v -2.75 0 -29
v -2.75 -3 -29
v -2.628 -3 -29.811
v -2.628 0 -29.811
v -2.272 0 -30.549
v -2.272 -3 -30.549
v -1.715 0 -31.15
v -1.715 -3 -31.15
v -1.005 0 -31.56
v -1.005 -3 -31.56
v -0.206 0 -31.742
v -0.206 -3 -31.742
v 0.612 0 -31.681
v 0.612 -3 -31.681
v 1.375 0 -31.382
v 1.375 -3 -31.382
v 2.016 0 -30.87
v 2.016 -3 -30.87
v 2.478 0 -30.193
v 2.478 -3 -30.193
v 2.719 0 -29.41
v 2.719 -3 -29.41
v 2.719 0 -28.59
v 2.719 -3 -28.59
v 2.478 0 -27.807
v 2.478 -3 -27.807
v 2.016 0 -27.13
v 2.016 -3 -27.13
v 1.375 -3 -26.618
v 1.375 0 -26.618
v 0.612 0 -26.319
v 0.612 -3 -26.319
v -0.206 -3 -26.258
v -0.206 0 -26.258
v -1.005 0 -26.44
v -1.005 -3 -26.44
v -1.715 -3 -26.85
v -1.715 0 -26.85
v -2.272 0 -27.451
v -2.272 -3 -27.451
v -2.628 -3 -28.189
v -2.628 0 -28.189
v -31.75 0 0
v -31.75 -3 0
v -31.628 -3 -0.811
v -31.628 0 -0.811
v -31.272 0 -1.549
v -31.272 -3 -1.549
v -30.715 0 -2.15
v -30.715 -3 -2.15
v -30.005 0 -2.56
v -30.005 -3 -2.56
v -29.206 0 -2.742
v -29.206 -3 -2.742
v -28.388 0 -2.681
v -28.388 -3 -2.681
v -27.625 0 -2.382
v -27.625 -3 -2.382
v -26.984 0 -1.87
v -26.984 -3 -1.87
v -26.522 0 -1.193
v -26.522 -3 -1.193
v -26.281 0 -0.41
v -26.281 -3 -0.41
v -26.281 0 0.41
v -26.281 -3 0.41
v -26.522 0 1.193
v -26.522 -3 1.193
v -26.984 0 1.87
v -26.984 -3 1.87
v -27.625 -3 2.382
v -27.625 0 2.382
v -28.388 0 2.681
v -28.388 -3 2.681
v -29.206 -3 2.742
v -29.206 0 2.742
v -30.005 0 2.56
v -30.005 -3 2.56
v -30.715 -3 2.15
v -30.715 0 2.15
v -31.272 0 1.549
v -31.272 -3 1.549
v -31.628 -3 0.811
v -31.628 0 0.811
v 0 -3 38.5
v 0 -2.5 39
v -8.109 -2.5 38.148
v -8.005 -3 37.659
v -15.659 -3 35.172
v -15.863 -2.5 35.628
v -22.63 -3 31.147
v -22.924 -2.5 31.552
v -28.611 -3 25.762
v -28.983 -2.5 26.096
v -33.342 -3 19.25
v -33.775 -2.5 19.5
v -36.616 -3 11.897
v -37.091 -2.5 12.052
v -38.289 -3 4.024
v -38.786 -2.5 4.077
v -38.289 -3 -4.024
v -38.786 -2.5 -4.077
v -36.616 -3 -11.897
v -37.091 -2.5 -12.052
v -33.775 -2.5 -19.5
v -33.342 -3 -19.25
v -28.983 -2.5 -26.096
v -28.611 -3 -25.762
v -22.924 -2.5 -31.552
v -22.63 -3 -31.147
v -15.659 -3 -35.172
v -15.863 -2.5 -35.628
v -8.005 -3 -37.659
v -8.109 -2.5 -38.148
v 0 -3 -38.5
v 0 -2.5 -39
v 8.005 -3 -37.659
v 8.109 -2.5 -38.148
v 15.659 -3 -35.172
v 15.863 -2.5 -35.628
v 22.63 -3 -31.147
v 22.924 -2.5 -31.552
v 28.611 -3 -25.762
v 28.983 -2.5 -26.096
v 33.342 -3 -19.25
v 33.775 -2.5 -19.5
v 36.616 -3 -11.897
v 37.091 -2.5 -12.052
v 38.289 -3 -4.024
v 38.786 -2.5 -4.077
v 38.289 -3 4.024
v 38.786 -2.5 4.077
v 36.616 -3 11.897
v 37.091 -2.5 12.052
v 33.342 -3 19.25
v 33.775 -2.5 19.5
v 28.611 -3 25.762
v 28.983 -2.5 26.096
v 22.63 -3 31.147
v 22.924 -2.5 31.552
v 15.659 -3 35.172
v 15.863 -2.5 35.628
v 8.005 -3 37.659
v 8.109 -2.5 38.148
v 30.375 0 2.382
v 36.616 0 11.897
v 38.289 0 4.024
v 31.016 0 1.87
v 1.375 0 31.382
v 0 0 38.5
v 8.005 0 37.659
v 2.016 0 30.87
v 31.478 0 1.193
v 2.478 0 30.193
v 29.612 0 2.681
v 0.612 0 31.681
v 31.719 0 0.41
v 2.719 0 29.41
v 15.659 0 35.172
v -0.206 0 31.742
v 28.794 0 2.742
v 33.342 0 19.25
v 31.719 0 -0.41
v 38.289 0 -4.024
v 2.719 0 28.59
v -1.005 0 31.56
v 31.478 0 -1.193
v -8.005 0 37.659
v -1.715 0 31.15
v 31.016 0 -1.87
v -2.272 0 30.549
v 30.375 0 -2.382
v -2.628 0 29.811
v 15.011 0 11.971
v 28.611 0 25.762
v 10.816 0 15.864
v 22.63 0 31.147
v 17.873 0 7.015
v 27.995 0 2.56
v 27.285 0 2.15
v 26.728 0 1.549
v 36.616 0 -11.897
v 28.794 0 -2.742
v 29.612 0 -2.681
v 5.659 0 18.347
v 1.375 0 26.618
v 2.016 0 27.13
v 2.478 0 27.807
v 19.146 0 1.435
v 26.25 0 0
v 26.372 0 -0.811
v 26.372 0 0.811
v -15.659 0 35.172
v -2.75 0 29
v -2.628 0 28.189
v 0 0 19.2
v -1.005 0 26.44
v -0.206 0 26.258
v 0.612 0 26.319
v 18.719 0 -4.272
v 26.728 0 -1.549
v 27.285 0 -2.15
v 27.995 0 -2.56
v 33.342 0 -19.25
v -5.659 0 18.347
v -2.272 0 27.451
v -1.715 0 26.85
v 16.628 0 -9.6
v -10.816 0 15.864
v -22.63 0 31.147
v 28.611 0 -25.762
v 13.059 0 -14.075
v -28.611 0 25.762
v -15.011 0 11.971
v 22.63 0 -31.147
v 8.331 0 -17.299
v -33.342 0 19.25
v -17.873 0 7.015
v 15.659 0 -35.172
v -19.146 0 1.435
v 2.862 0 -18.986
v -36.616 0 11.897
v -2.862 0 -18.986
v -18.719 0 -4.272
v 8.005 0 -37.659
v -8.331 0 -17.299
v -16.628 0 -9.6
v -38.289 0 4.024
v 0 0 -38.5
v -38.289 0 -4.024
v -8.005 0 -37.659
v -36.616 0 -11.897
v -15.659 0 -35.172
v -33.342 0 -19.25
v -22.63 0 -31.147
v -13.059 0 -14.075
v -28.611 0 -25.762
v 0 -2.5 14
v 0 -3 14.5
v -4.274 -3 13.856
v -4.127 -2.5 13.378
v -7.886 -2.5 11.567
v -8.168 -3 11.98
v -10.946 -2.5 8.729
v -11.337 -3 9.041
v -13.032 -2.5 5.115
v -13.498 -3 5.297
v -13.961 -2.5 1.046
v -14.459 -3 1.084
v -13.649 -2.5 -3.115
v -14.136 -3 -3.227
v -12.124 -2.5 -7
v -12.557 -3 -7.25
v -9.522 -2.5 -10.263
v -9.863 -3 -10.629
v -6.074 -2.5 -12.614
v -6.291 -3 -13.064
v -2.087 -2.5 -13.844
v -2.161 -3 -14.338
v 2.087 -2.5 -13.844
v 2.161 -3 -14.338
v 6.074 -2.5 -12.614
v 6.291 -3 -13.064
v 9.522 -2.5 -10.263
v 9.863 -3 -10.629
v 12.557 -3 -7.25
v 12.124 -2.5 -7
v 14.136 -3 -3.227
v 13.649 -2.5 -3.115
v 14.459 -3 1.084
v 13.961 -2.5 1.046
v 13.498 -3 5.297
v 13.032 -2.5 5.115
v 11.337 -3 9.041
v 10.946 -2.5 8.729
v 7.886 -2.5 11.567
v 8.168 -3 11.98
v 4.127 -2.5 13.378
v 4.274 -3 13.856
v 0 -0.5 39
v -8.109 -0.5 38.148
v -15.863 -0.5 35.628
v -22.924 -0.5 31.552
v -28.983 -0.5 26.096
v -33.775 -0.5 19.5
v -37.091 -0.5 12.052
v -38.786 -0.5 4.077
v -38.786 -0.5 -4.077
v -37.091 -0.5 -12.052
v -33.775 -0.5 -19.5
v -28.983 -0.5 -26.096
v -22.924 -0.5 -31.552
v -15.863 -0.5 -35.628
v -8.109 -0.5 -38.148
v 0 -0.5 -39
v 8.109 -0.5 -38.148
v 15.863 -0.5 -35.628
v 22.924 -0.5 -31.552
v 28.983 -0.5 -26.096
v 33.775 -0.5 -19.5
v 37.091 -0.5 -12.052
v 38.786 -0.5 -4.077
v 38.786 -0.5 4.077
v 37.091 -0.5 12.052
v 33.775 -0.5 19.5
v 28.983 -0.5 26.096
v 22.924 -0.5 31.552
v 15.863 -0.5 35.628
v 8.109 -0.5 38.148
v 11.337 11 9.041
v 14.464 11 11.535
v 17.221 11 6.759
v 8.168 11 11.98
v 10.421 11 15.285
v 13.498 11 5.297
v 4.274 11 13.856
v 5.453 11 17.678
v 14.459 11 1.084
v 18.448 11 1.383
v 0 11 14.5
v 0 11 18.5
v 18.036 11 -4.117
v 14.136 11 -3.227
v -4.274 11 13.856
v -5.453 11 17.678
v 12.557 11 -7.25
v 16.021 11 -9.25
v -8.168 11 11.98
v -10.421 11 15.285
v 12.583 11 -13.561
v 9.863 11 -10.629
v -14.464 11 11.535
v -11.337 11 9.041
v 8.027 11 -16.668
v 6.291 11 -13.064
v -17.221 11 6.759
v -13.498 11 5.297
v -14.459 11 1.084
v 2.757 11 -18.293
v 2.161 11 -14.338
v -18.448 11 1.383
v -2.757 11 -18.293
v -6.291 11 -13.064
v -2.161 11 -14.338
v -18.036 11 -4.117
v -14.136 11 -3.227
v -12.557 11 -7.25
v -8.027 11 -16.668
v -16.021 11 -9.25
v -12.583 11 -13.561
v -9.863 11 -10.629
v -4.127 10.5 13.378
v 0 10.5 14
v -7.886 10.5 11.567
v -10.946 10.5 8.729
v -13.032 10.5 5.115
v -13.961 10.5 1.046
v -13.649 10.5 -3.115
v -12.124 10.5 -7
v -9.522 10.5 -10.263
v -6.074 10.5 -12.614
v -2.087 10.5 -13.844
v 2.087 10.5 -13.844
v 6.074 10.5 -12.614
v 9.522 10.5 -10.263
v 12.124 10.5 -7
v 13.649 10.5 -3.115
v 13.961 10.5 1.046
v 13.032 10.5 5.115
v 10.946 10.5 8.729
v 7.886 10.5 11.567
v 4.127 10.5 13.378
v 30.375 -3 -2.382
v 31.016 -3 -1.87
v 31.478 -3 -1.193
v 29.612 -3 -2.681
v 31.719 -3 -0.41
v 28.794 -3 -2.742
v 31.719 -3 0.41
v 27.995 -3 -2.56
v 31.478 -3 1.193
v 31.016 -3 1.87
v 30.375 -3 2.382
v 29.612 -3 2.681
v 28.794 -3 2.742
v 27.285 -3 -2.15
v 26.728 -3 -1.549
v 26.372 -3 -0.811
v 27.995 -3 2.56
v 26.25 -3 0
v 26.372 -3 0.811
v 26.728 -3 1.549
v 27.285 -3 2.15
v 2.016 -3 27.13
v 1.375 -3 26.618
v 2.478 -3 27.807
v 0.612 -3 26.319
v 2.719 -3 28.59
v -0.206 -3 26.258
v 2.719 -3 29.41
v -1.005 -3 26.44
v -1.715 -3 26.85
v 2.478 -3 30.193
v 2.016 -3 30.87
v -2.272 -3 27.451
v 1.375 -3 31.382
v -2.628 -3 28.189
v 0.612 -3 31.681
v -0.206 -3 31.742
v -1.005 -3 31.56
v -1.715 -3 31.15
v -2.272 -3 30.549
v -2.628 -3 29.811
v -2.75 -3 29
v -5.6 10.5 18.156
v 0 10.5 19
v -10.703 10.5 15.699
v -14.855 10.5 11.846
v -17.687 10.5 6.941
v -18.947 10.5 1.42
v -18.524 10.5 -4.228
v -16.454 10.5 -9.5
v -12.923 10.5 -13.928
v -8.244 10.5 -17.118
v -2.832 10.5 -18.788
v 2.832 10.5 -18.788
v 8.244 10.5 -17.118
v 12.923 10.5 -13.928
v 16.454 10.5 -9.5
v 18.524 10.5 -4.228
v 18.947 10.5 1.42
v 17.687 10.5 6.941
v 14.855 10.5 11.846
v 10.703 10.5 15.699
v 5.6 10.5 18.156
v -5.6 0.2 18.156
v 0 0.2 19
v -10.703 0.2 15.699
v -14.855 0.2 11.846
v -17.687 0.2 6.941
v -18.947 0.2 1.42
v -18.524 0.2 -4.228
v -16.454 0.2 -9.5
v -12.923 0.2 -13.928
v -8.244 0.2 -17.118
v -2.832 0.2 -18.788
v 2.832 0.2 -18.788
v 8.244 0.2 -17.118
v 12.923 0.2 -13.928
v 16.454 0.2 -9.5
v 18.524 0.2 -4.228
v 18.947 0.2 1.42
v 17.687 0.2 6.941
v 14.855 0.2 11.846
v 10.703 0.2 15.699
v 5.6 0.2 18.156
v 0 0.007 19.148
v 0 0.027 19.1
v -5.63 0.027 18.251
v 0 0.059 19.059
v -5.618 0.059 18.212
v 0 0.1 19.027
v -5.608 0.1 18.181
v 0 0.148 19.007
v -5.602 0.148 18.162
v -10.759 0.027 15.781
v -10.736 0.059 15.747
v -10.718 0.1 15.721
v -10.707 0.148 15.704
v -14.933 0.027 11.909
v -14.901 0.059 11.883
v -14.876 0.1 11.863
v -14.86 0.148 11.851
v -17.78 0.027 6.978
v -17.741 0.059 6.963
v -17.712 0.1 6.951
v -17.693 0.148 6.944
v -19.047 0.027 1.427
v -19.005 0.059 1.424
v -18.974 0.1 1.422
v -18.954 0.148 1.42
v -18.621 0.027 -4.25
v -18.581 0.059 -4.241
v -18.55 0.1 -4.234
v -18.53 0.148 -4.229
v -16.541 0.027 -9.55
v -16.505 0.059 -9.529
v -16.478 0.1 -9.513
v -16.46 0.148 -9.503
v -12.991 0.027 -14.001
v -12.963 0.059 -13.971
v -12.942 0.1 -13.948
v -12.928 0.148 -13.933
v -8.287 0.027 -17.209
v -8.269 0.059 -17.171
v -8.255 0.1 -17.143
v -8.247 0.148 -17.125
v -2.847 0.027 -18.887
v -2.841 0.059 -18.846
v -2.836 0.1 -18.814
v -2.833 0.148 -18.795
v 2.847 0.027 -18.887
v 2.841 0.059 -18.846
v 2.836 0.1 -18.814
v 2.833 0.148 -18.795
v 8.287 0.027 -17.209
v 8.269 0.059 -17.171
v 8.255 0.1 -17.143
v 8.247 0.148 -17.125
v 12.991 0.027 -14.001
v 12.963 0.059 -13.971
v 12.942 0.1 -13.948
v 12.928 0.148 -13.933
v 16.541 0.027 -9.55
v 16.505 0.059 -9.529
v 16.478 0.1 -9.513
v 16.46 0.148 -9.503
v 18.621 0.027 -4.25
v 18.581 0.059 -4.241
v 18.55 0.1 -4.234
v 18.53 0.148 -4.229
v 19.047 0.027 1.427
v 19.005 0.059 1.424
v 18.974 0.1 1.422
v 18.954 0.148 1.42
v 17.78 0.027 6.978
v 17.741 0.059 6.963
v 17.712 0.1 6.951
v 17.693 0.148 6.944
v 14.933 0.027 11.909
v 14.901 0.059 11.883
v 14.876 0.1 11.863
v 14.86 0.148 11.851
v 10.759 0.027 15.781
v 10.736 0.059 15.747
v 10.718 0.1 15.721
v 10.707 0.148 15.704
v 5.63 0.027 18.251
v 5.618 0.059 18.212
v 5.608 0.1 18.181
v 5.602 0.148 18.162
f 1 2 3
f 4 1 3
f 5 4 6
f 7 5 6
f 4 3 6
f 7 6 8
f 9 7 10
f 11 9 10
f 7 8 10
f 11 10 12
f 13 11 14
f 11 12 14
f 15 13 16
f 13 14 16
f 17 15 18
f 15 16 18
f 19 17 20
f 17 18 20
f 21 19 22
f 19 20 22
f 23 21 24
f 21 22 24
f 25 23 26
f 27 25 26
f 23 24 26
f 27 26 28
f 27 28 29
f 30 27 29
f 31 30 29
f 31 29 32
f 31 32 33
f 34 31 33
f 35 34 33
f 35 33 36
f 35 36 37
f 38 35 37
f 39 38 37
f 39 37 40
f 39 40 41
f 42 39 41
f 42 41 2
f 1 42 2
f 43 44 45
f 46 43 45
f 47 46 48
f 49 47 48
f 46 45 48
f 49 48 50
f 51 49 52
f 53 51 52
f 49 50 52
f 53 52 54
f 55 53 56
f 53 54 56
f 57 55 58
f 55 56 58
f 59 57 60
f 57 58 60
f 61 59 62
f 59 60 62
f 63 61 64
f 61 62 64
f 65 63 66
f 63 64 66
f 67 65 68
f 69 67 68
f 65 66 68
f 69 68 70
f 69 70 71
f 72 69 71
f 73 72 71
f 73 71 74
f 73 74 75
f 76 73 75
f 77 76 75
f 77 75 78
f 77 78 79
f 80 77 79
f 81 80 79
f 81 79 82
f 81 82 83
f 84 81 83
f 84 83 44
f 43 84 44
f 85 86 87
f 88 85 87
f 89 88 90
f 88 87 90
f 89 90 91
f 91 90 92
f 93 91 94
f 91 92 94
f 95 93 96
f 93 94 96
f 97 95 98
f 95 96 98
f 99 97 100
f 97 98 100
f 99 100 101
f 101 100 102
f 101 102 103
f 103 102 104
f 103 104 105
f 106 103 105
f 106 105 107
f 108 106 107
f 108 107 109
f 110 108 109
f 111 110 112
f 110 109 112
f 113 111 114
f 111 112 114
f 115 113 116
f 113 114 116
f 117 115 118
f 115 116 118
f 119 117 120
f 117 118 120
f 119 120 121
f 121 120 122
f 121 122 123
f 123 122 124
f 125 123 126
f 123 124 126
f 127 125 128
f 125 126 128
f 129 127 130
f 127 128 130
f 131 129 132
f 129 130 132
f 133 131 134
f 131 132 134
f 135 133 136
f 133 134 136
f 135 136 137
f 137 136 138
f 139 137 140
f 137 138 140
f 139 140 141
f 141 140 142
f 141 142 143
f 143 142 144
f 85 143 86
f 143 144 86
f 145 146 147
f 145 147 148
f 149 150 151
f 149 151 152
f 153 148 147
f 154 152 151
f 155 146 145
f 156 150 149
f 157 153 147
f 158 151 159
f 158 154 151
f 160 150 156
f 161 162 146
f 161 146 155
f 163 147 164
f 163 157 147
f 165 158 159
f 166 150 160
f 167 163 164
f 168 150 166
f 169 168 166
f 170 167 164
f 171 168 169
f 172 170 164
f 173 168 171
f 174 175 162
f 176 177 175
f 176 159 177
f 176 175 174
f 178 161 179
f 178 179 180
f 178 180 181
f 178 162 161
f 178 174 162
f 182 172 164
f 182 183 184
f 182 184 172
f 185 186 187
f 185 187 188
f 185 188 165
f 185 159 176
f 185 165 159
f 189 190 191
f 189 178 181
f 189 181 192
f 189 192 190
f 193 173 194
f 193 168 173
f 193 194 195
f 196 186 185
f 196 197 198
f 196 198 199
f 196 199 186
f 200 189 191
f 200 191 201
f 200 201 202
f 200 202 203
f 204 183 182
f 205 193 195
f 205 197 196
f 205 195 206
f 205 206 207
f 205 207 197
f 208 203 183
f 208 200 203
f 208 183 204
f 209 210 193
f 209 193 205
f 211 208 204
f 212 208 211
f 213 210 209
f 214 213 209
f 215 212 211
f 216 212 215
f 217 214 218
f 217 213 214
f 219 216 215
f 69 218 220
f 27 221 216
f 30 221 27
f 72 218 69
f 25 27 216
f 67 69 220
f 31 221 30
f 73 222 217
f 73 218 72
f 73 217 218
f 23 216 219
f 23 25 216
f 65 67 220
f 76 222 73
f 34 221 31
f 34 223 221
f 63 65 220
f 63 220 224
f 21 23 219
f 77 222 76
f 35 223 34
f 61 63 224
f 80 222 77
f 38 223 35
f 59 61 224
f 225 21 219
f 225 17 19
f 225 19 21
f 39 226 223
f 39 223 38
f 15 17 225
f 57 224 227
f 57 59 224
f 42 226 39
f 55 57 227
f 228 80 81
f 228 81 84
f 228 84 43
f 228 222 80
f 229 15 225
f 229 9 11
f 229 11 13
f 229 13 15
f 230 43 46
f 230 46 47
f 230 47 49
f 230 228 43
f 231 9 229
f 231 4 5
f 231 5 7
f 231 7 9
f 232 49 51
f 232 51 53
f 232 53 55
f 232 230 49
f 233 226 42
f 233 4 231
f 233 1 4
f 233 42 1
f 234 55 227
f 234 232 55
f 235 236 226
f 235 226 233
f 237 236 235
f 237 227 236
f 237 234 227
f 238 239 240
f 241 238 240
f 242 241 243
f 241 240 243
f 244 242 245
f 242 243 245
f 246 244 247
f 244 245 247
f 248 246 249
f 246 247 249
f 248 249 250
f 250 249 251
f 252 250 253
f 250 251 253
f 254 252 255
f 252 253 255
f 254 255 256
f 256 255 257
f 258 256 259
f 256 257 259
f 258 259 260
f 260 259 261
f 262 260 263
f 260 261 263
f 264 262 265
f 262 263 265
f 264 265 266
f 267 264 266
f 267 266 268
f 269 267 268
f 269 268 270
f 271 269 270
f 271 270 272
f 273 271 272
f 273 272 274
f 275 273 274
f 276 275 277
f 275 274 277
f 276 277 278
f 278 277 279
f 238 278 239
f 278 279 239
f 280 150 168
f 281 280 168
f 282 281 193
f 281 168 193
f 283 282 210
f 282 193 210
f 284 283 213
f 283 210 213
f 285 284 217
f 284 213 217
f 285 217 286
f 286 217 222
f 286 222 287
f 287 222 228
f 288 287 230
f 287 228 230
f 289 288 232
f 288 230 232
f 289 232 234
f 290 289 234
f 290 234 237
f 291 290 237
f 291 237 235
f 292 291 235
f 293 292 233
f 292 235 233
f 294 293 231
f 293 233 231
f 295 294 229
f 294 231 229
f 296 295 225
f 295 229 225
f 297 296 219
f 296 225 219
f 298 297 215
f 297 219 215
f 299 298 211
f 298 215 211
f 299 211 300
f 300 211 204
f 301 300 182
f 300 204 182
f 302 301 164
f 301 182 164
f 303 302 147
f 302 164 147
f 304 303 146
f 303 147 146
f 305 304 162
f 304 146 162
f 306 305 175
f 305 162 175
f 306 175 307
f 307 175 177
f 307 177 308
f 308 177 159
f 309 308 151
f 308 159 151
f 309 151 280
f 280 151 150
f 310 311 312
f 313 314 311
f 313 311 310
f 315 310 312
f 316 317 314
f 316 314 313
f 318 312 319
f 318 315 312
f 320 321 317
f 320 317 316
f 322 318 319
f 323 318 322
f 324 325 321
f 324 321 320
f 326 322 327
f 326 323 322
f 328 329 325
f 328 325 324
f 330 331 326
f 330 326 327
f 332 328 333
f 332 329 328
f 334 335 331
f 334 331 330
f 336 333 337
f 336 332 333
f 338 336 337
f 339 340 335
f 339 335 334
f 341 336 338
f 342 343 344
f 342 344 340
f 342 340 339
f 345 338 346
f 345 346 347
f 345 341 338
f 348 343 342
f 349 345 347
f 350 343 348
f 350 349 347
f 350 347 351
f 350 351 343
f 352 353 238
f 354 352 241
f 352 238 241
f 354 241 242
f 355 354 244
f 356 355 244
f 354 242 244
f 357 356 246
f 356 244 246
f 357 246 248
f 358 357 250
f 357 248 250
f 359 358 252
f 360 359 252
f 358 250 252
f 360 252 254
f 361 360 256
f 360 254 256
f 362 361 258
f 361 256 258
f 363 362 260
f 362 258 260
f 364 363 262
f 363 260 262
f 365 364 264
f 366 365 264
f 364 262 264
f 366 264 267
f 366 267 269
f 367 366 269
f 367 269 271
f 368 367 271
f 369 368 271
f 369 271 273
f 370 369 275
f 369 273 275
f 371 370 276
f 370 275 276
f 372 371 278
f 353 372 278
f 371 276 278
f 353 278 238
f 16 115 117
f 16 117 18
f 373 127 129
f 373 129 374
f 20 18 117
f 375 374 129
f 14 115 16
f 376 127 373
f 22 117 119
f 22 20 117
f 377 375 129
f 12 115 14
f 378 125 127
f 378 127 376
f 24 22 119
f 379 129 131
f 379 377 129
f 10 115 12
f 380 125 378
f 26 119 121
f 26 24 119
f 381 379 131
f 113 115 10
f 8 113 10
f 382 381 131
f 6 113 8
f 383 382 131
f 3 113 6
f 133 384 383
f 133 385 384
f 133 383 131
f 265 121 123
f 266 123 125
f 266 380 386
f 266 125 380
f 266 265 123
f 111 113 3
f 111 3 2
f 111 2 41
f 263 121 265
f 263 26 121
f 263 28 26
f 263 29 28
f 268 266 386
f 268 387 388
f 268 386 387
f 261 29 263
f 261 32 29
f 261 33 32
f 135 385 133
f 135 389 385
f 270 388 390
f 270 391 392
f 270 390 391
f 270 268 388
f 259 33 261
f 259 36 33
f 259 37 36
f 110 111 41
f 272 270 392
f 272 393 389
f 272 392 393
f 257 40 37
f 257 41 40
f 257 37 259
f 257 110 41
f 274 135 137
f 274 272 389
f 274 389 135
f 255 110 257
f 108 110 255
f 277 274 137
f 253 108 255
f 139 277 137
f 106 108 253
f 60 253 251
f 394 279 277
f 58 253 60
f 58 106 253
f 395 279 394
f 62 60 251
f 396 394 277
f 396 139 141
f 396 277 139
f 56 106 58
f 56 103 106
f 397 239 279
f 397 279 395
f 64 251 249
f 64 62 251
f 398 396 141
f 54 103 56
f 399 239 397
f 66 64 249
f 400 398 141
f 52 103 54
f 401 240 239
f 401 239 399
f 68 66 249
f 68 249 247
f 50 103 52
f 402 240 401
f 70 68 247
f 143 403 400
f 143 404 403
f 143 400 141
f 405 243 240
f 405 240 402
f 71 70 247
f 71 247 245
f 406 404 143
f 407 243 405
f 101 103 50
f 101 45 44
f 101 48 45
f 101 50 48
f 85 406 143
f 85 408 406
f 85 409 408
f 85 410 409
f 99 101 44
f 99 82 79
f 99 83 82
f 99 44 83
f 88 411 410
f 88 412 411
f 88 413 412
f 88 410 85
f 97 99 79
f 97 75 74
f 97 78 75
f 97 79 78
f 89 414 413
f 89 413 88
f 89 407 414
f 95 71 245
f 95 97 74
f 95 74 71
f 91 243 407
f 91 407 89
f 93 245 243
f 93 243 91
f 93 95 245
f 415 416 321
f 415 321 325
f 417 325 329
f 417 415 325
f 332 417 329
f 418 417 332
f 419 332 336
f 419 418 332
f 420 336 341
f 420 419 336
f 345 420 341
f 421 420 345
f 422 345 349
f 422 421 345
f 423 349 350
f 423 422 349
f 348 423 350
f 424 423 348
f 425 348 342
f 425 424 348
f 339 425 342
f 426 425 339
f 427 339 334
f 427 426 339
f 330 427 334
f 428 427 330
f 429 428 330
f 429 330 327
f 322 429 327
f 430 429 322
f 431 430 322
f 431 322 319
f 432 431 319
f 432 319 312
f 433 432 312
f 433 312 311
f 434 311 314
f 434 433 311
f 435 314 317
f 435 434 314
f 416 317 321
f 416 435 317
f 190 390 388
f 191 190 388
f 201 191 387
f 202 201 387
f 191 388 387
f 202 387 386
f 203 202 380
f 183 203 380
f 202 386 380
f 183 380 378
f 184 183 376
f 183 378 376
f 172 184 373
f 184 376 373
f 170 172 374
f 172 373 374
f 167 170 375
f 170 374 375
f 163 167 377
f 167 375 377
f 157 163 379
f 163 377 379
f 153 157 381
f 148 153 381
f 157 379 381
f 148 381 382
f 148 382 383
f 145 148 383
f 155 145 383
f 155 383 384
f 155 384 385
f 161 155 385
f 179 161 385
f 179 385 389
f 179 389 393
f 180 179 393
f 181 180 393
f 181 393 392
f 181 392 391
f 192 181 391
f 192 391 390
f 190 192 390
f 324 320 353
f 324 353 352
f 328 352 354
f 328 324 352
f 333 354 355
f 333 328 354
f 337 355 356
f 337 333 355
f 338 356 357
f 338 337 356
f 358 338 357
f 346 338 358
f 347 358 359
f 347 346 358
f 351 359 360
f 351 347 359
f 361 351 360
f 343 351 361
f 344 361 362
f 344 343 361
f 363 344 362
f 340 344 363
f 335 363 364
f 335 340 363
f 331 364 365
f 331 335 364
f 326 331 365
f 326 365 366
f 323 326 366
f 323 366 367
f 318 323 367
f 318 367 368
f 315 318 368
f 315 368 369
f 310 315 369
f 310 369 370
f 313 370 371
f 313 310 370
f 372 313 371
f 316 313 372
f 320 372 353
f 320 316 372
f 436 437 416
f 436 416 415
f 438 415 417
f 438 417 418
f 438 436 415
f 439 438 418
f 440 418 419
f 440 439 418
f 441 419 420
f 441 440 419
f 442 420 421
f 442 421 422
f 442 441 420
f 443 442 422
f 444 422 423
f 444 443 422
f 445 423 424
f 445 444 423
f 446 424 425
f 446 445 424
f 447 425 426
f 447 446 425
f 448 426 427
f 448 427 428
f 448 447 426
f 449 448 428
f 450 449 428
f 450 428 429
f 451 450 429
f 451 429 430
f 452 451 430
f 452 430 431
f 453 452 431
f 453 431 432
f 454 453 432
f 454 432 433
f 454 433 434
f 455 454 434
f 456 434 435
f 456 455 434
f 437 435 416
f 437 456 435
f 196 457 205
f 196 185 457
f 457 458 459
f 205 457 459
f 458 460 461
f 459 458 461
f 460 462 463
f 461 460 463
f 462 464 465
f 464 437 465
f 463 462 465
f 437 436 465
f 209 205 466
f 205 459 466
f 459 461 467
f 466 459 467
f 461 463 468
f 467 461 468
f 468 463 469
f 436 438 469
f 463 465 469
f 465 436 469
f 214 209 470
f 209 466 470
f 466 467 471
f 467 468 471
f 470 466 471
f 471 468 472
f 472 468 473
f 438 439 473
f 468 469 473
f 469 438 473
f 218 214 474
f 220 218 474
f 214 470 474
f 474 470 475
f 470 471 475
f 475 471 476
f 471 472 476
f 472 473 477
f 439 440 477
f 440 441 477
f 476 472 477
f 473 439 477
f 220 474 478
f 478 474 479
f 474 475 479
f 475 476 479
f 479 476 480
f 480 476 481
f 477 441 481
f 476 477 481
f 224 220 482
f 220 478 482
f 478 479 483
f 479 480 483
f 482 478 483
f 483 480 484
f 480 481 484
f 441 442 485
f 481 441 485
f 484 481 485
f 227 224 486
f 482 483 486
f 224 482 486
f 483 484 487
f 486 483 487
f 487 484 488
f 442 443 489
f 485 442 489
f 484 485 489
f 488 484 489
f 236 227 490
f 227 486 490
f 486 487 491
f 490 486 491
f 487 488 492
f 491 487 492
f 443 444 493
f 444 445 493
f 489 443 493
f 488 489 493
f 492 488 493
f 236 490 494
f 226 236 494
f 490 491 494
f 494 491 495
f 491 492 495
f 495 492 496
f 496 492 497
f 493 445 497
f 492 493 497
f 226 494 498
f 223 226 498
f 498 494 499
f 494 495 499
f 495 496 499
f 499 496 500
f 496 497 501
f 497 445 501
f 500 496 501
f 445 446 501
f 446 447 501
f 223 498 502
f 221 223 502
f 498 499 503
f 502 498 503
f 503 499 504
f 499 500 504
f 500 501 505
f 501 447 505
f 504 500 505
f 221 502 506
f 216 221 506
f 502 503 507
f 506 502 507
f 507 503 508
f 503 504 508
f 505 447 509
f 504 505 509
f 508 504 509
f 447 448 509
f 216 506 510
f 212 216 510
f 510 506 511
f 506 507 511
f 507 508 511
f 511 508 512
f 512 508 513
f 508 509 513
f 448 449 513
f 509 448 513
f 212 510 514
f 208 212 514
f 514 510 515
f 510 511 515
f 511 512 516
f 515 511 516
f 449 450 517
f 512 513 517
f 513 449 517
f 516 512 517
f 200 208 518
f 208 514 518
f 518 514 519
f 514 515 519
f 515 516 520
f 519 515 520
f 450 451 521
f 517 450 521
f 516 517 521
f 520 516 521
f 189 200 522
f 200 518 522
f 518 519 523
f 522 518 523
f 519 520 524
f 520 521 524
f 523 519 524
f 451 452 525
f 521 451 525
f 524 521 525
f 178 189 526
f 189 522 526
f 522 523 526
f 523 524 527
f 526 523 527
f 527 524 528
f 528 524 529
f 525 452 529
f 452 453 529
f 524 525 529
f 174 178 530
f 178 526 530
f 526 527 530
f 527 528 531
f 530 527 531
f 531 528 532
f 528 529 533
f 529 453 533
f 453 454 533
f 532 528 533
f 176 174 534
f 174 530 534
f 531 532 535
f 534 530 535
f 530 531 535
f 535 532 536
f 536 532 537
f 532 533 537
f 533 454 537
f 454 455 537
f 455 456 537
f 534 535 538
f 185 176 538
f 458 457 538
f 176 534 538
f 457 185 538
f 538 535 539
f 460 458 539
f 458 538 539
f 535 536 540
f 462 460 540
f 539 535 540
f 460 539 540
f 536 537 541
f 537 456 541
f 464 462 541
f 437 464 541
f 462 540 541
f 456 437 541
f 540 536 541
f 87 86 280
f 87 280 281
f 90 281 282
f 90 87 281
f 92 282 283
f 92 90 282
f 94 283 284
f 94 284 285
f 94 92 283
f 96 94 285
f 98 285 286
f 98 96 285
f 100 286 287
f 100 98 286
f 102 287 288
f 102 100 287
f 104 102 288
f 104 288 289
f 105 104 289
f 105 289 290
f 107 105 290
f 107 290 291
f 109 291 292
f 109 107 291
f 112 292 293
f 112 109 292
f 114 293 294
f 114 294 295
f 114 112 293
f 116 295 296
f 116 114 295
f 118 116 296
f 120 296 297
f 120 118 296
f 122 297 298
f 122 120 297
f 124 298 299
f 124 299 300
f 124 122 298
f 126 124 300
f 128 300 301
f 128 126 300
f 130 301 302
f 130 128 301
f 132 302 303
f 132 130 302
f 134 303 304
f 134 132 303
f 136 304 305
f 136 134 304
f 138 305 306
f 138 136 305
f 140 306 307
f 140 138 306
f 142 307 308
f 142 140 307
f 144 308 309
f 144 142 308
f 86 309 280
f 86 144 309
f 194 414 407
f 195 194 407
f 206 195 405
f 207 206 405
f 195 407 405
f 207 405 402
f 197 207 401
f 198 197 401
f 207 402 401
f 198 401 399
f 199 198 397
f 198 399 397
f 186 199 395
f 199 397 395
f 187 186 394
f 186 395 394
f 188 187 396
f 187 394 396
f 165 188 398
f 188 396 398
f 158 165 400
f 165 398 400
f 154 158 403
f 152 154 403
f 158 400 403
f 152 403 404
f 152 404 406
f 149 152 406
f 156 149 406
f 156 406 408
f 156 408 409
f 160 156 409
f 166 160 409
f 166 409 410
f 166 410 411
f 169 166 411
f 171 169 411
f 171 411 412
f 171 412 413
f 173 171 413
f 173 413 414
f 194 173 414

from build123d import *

# Parameters (mm, degrees)
M5_CLEARANCE_HOLE1_D = 5.5
FILLET1_R            = 0.2
CHAMFER1_SIZE        = 0.5
SKETCH7_R            = 14
CUT_EXTRUDE2_DEPTH   = 57.903426962
CHAMFER2_SIZE        = 0.5


with BuildPart() as part:
    # Sketch1 → Revolve1 (revolve)
    with BuildSketch(Plane.XY, mode=Mode.PRIVATE) as revolve1_sk:
        Polygon((14, -3), (14, 8), (12, 8), (12, 11), (19, 11), (19, 0), (39, 0), (39, -3), align=None)
    revolve(revolve1_sk.sketch.rotate(Axis((0, 17.954019247, 0), (0, -1, 0)), 90), axis=Axis((0, 17.954019247, 0), (0, -1, 0)))

    # M5 Clearance Hole1 (through all)
    with Locations(Plane(origin=(0, 0, 0), x_dir=(1, 0, 0), z_dir=(0, 1, 0))):
        with Locations((0, 29), (29, 0), (0, -29), (-29, 0)):
            Hole(M5_CLEARANCE_HOLE1_D / 2)

    # Fillet1
    fillet1_edges = [part.edges().sort_by_distance(p)[0] for p in [
        (0, 0, -19),
        (0, 8, -14),
    ]]
    fillet(fillet1_edges, radius=FILLET1_R)

    # Chamfer1
    chamfer1_edges = [part.edges().sort_by_distance(p)[0] for p in [
        (0, 8, -12),
        (0, 11, -12),
        (0, 11, -19),
        (0, 0, -39),
        (0, -3, -39),
        (0, -3, -14),
    ]]
    chamfer(chamfer1_edges, length=CHAMFER1_SIZE)

    # Sketch7 → Cut-Extrude2 (cut, through all)
    with BuildSketch(Plane.XZ.offset(3)):
        with Locations(Location((0, 0, 0), (0, 0, 90))):
            Circle(SKETCH7_R)
    extrude(amount=-CUT_EXTRUDE2_DEPTH, mode=Mode.SUBTRACT)

    # Chamfer2
    chamfer2_edges = [part.edges().sort_by_distance(p)[0] for p in [
        (0, 11, -14),
    ]]
    chamfer(chamfer2_edges, length=CHAMFER2_SIZE)


solid = part.part
